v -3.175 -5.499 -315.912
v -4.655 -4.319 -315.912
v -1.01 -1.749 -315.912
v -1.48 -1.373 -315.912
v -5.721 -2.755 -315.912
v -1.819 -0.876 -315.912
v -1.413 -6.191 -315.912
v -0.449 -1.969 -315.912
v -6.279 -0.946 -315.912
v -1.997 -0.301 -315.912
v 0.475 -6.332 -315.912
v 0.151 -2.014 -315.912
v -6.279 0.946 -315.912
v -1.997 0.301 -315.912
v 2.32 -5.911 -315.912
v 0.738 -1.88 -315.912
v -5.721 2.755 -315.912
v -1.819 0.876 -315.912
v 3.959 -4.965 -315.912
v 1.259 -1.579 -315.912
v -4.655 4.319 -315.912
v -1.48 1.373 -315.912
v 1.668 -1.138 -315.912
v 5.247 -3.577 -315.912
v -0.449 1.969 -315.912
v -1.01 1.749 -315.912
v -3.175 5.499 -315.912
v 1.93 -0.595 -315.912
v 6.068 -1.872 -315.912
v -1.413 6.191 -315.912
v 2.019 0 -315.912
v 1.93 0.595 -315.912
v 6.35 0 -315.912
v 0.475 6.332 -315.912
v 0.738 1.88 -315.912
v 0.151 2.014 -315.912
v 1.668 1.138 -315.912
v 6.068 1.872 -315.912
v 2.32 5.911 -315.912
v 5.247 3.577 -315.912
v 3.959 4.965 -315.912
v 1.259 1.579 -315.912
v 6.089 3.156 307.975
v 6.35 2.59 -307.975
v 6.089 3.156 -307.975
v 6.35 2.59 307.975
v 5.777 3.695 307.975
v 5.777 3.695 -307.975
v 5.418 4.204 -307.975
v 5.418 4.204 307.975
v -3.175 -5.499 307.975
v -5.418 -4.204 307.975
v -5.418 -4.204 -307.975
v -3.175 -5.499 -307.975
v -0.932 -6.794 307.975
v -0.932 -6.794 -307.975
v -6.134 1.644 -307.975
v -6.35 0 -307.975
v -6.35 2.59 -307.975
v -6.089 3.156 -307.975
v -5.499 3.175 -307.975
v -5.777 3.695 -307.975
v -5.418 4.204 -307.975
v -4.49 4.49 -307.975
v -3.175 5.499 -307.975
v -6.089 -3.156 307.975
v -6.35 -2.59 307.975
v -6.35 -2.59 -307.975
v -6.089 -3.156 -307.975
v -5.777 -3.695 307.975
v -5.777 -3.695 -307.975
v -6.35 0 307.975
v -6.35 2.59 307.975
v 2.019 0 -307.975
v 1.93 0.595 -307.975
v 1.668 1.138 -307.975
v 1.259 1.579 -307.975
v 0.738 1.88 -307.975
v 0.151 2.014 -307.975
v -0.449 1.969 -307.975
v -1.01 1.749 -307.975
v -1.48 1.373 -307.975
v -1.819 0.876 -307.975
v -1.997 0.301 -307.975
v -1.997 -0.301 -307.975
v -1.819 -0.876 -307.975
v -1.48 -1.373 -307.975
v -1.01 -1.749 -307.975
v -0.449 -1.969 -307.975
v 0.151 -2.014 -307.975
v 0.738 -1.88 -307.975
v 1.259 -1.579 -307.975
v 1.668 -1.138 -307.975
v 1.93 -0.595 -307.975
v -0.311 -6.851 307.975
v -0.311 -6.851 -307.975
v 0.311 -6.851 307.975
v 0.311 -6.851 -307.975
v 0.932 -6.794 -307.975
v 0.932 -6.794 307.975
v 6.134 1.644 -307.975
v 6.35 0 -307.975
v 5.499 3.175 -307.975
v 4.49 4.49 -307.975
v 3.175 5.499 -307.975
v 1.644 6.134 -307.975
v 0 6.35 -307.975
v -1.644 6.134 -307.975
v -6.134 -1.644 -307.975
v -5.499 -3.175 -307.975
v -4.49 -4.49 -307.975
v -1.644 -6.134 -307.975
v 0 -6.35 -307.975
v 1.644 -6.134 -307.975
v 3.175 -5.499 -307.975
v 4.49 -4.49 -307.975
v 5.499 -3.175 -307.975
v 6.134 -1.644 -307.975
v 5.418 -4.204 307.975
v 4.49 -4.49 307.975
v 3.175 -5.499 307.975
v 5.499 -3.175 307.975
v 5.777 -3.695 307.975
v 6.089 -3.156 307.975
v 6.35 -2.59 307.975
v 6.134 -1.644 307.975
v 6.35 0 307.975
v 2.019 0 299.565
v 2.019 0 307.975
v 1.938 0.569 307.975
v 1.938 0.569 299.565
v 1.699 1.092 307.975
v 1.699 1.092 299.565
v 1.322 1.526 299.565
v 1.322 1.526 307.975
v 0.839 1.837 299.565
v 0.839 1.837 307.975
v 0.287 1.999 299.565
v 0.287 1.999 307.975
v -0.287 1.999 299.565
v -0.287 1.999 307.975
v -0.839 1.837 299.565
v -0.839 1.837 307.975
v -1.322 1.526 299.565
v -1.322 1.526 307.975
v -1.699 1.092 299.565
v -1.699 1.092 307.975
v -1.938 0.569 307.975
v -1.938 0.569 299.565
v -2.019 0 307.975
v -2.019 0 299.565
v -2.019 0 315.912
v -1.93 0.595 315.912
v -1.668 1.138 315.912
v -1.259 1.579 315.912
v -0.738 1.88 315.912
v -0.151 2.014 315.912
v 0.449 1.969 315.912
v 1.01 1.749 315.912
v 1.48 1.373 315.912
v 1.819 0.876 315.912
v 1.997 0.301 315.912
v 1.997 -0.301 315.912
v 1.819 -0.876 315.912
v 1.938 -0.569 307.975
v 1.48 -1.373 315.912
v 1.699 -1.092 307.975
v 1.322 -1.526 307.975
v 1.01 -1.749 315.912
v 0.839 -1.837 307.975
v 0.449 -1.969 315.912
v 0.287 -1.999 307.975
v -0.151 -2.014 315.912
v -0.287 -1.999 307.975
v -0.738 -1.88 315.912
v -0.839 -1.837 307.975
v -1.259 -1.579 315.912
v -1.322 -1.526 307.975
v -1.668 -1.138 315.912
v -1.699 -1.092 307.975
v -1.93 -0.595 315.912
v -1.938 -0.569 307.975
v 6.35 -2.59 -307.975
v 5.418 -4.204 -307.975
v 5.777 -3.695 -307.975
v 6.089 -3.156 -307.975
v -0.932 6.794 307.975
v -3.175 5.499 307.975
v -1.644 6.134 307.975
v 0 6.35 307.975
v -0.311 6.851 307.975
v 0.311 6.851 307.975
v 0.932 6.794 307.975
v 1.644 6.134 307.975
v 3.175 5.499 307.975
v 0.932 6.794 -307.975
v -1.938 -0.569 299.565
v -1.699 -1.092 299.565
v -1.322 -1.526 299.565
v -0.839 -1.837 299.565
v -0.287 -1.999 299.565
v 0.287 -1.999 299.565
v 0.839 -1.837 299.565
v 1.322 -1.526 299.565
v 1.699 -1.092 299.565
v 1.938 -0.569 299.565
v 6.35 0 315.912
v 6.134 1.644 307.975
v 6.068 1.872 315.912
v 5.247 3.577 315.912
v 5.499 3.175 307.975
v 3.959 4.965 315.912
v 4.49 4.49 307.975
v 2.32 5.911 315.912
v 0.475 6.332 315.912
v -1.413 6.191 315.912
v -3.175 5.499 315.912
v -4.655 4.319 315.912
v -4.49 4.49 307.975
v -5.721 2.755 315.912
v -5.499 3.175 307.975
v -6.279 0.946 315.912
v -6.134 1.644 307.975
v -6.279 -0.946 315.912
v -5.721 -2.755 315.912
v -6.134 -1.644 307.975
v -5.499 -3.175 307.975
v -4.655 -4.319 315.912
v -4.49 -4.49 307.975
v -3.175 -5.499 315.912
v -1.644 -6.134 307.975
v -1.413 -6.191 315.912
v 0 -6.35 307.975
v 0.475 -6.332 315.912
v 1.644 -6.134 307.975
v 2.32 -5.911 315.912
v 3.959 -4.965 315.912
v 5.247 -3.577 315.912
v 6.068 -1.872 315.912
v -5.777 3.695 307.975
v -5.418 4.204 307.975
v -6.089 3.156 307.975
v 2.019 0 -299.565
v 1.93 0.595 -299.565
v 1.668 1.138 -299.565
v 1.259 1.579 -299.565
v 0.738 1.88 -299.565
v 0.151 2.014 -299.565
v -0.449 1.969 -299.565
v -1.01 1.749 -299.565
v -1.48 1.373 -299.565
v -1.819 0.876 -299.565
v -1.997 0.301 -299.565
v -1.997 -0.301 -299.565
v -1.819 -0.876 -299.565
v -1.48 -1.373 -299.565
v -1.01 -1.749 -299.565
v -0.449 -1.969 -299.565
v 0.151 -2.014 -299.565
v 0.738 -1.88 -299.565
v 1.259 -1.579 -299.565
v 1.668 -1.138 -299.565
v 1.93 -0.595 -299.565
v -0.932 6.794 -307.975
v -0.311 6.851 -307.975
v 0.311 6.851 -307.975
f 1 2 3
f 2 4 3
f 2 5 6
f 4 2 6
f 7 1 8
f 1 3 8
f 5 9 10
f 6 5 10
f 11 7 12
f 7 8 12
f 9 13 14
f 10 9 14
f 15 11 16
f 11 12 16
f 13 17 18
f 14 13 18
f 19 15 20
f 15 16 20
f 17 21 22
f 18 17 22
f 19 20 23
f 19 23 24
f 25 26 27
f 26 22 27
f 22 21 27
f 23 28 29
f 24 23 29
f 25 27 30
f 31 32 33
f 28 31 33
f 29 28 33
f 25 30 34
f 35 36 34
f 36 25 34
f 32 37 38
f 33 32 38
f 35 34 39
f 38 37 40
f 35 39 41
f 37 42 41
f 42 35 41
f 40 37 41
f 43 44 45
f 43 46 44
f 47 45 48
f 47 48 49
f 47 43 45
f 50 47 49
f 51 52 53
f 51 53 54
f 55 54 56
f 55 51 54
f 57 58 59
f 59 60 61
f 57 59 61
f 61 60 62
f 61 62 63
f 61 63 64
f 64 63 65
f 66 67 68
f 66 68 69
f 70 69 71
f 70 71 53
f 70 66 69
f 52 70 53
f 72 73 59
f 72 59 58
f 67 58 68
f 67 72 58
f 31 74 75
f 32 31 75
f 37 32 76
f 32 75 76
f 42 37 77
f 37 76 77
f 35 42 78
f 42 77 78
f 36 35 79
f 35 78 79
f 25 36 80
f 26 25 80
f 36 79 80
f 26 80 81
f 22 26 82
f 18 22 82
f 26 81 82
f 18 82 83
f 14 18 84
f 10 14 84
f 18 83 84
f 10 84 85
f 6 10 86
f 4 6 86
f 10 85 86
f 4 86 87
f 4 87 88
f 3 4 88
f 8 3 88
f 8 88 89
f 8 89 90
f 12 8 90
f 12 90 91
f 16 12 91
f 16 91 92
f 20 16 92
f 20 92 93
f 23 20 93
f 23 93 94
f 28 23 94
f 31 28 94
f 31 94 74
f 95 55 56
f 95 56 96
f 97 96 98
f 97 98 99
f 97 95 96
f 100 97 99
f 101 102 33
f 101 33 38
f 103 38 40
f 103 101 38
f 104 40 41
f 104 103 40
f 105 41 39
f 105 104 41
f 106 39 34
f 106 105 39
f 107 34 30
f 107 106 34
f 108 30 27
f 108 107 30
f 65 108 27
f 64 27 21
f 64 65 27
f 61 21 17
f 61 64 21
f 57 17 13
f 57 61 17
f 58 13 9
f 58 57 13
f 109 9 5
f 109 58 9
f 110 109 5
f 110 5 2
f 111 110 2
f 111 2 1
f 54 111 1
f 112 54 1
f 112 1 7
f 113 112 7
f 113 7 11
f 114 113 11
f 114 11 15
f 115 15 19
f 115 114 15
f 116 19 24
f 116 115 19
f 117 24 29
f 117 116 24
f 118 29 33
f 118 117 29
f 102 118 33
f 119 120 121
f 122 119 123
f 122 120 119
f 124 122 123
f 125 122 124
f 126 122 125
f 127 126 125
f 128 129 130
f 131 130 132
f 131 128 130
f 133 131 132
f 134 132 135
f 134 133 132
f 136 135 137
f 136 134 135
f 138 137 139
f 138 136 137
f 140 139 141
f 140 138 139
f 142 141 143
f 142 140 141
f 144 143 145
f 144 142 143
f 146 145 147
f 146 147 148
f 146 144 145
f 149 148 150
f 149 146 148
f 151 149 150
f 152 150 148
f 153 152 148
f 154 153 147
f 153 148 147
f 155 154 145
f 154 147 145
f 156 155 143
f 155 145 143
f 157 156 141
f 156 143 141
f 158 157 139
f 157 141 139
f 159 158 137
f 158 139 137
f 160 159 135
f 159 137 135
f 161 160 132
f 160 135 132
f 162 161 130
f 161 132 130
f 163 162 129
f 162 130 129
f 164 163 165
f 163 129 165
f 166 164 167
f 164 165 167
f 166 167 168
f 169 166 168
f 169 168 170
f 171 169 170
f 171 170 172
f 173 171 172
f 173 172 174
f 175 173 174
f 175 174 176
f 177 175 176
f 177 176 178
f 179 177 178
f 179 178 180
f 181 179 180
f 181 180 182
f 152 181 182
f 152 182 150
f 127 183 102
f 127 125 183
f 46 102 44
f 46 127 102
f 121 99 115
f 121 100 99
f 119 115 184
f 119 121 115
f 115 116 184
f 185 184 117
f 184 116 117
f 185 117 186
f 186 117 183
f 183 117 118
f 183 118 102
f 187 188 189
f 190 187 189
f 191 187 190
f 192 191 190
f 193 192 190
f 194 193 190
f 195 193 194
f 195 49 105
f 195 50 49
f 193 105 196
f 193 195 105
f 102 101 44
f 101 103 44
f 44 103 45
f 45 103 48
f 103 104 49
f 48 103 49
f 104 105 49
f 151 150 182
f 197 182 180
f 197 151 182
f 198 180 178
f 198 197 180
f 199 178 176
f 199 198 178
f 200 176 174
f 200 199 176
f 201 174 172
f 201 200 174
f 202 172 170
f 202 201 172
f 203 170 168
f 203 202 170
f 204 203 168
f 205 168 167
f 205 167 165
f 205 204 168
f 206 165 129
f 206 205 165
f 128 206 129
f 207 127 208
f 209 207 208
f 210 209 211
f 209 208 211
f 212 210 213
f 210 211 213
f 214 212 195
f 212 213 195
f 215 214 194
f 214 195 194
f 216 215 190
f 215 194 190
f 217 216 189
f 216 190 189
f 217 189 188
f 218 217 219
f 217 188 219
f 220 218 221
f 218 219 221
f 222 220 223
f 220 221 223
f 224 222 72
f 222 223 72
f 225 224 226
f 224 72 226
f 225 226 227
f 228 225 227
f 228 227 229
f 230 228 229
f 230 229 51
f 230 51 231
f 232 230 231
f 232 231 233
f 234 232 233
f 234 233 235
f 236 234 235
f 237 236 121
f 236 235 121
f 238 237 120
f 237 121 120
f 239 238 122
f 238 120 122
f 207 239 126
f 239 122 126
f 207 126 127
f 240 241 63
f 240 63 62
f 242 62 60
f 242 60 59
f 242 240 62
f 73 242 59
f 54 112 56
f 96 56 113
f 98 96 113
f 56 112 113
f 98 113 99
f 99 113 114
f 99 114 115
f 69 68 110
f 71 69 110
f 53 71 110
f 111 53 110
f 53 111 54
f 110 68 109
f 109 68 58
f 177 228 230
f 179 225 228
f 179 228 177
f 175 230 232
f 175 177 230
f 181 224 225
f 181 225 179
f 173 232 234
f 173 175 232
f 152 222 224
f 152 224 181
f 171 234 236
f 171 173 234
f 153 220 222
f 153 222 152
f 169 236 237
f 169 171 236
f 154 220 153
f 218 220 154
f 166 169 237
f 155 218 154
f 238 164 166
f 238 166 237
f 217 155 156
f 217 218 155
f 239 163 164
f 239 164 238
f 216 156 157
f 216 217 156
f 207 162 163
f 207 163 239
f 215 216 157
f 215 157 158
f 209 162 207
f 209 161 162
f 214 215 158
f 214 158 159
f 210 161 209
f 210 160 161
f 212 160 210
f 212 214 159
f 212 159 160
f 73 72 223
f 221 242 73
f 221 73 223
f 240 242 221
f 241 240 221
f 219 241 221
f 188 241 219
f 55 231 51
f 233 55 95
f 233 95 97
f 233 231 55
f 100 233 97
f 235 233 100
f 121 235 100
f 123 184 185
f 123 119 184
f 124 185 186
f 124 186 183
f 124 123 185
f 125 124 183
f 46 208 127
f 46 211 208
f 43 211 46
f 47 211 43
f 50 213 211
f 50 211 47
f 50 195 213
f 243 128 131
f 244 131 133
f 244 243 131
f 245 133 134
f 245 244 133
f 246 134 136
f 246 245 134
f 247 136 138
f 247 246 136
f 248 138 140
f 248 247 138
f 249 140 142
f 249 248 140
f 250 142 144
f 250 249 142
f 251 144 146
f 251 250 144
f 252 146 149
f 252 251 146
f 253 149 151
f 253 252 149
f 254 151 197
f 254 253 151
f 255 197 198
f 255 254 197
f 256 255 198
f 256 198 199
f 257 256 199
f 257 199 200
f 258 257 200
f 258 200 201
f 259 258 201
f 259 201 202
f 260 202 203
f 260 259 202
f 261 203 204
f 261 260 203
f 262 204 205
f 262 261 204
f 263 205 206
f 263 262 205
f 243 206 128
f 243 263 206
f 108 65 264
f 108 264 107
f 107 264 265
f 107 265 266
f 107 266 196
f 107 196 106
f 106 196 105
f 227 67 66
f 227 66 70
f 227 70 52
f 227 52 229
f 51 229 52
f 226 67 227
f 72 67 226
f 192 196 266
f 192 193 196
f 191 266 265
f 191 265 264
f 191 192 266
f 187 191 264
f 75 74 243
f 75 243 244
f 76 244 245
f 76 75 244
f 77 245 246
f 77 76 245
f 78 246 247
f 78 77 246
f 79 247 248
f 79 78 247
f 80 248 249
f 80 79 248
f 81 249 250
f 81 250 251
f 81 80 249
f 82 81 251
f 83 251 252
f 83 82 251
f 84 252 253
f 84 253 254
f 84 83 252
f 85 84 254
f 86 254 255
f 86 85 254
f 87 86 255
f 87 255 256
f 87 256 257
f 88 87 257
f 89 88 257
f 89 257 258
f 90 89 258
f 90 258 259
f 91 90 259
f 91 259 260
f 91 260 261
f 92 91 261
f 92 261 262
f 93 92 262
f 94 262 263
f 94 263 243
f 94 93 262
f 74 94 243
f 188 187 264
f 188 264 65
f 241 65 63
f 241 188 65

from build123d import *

# Parameters (mm, degrees)
SKETCH2_R                            = 2.0193
BOSS_EXTRUDE1_DEPTH                  = 307.975
SKETCH7_R                            = 6.35
BOSS_EXTRUDE2_DEPTH                  = 7.9375
F_10_32_TAPPED_HOLE2_D               = 4.0386
F_10_32_TAPPED_HOLE2_DEPTH           = 16.34744
F_10_32_TAPPED_HOLE2_TIP             = 1.213317848
F_10_32_TAPPED_HOLE2_ON_FACE_2_D     = 4.0386
F_10_32_TAPPED_HOLE2_ON_FACE_2_DEPTH = 16.34744
F_10_32_TAPPED_HOLE2_ON_FACE_2_TIP   = 1.213317848


with BuildPart() as part:
    # Sketch2 → Boss-Extrude1 (new, symmetric)
    with BuildSketch(Plane.XY):
        with BuildLine():
            ThreePointArc((0.93173274, 6.79441227), (0, 6.858), (-0.93173274, 6.79441227))
            Line((-0.93173274, 6.79441227), (-5.41826726, 4.204110358))
            ThreePointArc((-5.41826726, 4.204110358), (-5.939202219, 3.429), (-6.35, 2.590301913))
            Line((-6.35, 2.590301913), (-6.35, -2.590301913))
            ThreePointArc((-6.35, -2.590301913), (-5.939202219, -3.429), (-5.41826726, -4.204110358))
            Line((-5.41826726, -4.204110358), (-0.93173274, -6.79441227))
            ThreePointArc((-0.93173274, -6.79441227), (0, -6.858), (0.93173274, -6.79441227))
            Line((0.93173274, -6.79441227), (5.41826726, -4.204110358))
            ThreePointArc((5.41826726, -4.204110358), (5.939202219, -3.429), (6.35, -2.590301913))
            Line((6.35, -2.590301913), (6.35, 2.590301913))
            ThreePointArc((6.35, 2.590301913), (5.939202219, 3.429), (5.41826726, 4.204110358))
            Line((5.41826726, 4.204110358), (0.93173274, 6.79441227))
        make_face()
        Circle(SKETCH2_R, mode=Mode.SUBTRACT)
    extrude(amount=BOSS_EXTRUDE1_DEPTH, both=True)

    # Sketch7 → Boss-Extrude2 (add)
    with BuildSketch(Plane.XY.offset(307.975)):
        Circle(SKETCH7_R)
    boss_extrude2 = extrude(amount=BOSS_EXTRUDE2_DEPTH)

    # Mirror1: Boss-Extrude2 across plane
    add(boss_extrude2.mirror(Plane.XY))

    # #10-32 Tapped Hole2
    with Locations(Plane.XY.offset(315.9125)):
        with Locations((0, 0)):
            Hole(F_10_32_TAPPED_HOLE2_D / 2, depth=F_10_32_TAPPED_HOLE2_DEPTH)
            with Locations((0, 0, -(F_10_32_TAPPED_HOLE2_DEPTH + F_10_32_TAPPED_HOLE2_TIP / 2))):  # 118° drill point
                Cone(0, F_10_32_TAPPED_HOLE2_D / 2, F_10_32_TAPPED_HOLE2_TIP, mode=Mode.SUBTRACT)

    # #10-32 Tapped Hole2 on face 2
    with Locations(Plane(origin=(0, 0, -315.9125), x_dir=(-1, 0, 0), z_dir=(0, 0, -1))):
        with Locations((0, 0)):
            Hole(F_10_32_TAPPED_HOLE2_ON_FACE_2_D / 2, depth=F_10_32_TAPPED_HOLE2_ON_FACE_2_DEPTH)
            with Locations((0, 0, -(F_10_32_TAPPED_HOLE2_ON_FACE_2_DEPTH + F_10_32_TAPPED_HOLE2_ON_FACE_2_TIP / 2))):  # 118° drill point
                Cone(0, F_10_32_TAPPED_HOLE2_ON_FACE_2_D / 2, F_10_32_TAPPED_HOLE2_ON_FACE_2_TIP, mode=Mode.SUBTRACT)


solid = part.part
